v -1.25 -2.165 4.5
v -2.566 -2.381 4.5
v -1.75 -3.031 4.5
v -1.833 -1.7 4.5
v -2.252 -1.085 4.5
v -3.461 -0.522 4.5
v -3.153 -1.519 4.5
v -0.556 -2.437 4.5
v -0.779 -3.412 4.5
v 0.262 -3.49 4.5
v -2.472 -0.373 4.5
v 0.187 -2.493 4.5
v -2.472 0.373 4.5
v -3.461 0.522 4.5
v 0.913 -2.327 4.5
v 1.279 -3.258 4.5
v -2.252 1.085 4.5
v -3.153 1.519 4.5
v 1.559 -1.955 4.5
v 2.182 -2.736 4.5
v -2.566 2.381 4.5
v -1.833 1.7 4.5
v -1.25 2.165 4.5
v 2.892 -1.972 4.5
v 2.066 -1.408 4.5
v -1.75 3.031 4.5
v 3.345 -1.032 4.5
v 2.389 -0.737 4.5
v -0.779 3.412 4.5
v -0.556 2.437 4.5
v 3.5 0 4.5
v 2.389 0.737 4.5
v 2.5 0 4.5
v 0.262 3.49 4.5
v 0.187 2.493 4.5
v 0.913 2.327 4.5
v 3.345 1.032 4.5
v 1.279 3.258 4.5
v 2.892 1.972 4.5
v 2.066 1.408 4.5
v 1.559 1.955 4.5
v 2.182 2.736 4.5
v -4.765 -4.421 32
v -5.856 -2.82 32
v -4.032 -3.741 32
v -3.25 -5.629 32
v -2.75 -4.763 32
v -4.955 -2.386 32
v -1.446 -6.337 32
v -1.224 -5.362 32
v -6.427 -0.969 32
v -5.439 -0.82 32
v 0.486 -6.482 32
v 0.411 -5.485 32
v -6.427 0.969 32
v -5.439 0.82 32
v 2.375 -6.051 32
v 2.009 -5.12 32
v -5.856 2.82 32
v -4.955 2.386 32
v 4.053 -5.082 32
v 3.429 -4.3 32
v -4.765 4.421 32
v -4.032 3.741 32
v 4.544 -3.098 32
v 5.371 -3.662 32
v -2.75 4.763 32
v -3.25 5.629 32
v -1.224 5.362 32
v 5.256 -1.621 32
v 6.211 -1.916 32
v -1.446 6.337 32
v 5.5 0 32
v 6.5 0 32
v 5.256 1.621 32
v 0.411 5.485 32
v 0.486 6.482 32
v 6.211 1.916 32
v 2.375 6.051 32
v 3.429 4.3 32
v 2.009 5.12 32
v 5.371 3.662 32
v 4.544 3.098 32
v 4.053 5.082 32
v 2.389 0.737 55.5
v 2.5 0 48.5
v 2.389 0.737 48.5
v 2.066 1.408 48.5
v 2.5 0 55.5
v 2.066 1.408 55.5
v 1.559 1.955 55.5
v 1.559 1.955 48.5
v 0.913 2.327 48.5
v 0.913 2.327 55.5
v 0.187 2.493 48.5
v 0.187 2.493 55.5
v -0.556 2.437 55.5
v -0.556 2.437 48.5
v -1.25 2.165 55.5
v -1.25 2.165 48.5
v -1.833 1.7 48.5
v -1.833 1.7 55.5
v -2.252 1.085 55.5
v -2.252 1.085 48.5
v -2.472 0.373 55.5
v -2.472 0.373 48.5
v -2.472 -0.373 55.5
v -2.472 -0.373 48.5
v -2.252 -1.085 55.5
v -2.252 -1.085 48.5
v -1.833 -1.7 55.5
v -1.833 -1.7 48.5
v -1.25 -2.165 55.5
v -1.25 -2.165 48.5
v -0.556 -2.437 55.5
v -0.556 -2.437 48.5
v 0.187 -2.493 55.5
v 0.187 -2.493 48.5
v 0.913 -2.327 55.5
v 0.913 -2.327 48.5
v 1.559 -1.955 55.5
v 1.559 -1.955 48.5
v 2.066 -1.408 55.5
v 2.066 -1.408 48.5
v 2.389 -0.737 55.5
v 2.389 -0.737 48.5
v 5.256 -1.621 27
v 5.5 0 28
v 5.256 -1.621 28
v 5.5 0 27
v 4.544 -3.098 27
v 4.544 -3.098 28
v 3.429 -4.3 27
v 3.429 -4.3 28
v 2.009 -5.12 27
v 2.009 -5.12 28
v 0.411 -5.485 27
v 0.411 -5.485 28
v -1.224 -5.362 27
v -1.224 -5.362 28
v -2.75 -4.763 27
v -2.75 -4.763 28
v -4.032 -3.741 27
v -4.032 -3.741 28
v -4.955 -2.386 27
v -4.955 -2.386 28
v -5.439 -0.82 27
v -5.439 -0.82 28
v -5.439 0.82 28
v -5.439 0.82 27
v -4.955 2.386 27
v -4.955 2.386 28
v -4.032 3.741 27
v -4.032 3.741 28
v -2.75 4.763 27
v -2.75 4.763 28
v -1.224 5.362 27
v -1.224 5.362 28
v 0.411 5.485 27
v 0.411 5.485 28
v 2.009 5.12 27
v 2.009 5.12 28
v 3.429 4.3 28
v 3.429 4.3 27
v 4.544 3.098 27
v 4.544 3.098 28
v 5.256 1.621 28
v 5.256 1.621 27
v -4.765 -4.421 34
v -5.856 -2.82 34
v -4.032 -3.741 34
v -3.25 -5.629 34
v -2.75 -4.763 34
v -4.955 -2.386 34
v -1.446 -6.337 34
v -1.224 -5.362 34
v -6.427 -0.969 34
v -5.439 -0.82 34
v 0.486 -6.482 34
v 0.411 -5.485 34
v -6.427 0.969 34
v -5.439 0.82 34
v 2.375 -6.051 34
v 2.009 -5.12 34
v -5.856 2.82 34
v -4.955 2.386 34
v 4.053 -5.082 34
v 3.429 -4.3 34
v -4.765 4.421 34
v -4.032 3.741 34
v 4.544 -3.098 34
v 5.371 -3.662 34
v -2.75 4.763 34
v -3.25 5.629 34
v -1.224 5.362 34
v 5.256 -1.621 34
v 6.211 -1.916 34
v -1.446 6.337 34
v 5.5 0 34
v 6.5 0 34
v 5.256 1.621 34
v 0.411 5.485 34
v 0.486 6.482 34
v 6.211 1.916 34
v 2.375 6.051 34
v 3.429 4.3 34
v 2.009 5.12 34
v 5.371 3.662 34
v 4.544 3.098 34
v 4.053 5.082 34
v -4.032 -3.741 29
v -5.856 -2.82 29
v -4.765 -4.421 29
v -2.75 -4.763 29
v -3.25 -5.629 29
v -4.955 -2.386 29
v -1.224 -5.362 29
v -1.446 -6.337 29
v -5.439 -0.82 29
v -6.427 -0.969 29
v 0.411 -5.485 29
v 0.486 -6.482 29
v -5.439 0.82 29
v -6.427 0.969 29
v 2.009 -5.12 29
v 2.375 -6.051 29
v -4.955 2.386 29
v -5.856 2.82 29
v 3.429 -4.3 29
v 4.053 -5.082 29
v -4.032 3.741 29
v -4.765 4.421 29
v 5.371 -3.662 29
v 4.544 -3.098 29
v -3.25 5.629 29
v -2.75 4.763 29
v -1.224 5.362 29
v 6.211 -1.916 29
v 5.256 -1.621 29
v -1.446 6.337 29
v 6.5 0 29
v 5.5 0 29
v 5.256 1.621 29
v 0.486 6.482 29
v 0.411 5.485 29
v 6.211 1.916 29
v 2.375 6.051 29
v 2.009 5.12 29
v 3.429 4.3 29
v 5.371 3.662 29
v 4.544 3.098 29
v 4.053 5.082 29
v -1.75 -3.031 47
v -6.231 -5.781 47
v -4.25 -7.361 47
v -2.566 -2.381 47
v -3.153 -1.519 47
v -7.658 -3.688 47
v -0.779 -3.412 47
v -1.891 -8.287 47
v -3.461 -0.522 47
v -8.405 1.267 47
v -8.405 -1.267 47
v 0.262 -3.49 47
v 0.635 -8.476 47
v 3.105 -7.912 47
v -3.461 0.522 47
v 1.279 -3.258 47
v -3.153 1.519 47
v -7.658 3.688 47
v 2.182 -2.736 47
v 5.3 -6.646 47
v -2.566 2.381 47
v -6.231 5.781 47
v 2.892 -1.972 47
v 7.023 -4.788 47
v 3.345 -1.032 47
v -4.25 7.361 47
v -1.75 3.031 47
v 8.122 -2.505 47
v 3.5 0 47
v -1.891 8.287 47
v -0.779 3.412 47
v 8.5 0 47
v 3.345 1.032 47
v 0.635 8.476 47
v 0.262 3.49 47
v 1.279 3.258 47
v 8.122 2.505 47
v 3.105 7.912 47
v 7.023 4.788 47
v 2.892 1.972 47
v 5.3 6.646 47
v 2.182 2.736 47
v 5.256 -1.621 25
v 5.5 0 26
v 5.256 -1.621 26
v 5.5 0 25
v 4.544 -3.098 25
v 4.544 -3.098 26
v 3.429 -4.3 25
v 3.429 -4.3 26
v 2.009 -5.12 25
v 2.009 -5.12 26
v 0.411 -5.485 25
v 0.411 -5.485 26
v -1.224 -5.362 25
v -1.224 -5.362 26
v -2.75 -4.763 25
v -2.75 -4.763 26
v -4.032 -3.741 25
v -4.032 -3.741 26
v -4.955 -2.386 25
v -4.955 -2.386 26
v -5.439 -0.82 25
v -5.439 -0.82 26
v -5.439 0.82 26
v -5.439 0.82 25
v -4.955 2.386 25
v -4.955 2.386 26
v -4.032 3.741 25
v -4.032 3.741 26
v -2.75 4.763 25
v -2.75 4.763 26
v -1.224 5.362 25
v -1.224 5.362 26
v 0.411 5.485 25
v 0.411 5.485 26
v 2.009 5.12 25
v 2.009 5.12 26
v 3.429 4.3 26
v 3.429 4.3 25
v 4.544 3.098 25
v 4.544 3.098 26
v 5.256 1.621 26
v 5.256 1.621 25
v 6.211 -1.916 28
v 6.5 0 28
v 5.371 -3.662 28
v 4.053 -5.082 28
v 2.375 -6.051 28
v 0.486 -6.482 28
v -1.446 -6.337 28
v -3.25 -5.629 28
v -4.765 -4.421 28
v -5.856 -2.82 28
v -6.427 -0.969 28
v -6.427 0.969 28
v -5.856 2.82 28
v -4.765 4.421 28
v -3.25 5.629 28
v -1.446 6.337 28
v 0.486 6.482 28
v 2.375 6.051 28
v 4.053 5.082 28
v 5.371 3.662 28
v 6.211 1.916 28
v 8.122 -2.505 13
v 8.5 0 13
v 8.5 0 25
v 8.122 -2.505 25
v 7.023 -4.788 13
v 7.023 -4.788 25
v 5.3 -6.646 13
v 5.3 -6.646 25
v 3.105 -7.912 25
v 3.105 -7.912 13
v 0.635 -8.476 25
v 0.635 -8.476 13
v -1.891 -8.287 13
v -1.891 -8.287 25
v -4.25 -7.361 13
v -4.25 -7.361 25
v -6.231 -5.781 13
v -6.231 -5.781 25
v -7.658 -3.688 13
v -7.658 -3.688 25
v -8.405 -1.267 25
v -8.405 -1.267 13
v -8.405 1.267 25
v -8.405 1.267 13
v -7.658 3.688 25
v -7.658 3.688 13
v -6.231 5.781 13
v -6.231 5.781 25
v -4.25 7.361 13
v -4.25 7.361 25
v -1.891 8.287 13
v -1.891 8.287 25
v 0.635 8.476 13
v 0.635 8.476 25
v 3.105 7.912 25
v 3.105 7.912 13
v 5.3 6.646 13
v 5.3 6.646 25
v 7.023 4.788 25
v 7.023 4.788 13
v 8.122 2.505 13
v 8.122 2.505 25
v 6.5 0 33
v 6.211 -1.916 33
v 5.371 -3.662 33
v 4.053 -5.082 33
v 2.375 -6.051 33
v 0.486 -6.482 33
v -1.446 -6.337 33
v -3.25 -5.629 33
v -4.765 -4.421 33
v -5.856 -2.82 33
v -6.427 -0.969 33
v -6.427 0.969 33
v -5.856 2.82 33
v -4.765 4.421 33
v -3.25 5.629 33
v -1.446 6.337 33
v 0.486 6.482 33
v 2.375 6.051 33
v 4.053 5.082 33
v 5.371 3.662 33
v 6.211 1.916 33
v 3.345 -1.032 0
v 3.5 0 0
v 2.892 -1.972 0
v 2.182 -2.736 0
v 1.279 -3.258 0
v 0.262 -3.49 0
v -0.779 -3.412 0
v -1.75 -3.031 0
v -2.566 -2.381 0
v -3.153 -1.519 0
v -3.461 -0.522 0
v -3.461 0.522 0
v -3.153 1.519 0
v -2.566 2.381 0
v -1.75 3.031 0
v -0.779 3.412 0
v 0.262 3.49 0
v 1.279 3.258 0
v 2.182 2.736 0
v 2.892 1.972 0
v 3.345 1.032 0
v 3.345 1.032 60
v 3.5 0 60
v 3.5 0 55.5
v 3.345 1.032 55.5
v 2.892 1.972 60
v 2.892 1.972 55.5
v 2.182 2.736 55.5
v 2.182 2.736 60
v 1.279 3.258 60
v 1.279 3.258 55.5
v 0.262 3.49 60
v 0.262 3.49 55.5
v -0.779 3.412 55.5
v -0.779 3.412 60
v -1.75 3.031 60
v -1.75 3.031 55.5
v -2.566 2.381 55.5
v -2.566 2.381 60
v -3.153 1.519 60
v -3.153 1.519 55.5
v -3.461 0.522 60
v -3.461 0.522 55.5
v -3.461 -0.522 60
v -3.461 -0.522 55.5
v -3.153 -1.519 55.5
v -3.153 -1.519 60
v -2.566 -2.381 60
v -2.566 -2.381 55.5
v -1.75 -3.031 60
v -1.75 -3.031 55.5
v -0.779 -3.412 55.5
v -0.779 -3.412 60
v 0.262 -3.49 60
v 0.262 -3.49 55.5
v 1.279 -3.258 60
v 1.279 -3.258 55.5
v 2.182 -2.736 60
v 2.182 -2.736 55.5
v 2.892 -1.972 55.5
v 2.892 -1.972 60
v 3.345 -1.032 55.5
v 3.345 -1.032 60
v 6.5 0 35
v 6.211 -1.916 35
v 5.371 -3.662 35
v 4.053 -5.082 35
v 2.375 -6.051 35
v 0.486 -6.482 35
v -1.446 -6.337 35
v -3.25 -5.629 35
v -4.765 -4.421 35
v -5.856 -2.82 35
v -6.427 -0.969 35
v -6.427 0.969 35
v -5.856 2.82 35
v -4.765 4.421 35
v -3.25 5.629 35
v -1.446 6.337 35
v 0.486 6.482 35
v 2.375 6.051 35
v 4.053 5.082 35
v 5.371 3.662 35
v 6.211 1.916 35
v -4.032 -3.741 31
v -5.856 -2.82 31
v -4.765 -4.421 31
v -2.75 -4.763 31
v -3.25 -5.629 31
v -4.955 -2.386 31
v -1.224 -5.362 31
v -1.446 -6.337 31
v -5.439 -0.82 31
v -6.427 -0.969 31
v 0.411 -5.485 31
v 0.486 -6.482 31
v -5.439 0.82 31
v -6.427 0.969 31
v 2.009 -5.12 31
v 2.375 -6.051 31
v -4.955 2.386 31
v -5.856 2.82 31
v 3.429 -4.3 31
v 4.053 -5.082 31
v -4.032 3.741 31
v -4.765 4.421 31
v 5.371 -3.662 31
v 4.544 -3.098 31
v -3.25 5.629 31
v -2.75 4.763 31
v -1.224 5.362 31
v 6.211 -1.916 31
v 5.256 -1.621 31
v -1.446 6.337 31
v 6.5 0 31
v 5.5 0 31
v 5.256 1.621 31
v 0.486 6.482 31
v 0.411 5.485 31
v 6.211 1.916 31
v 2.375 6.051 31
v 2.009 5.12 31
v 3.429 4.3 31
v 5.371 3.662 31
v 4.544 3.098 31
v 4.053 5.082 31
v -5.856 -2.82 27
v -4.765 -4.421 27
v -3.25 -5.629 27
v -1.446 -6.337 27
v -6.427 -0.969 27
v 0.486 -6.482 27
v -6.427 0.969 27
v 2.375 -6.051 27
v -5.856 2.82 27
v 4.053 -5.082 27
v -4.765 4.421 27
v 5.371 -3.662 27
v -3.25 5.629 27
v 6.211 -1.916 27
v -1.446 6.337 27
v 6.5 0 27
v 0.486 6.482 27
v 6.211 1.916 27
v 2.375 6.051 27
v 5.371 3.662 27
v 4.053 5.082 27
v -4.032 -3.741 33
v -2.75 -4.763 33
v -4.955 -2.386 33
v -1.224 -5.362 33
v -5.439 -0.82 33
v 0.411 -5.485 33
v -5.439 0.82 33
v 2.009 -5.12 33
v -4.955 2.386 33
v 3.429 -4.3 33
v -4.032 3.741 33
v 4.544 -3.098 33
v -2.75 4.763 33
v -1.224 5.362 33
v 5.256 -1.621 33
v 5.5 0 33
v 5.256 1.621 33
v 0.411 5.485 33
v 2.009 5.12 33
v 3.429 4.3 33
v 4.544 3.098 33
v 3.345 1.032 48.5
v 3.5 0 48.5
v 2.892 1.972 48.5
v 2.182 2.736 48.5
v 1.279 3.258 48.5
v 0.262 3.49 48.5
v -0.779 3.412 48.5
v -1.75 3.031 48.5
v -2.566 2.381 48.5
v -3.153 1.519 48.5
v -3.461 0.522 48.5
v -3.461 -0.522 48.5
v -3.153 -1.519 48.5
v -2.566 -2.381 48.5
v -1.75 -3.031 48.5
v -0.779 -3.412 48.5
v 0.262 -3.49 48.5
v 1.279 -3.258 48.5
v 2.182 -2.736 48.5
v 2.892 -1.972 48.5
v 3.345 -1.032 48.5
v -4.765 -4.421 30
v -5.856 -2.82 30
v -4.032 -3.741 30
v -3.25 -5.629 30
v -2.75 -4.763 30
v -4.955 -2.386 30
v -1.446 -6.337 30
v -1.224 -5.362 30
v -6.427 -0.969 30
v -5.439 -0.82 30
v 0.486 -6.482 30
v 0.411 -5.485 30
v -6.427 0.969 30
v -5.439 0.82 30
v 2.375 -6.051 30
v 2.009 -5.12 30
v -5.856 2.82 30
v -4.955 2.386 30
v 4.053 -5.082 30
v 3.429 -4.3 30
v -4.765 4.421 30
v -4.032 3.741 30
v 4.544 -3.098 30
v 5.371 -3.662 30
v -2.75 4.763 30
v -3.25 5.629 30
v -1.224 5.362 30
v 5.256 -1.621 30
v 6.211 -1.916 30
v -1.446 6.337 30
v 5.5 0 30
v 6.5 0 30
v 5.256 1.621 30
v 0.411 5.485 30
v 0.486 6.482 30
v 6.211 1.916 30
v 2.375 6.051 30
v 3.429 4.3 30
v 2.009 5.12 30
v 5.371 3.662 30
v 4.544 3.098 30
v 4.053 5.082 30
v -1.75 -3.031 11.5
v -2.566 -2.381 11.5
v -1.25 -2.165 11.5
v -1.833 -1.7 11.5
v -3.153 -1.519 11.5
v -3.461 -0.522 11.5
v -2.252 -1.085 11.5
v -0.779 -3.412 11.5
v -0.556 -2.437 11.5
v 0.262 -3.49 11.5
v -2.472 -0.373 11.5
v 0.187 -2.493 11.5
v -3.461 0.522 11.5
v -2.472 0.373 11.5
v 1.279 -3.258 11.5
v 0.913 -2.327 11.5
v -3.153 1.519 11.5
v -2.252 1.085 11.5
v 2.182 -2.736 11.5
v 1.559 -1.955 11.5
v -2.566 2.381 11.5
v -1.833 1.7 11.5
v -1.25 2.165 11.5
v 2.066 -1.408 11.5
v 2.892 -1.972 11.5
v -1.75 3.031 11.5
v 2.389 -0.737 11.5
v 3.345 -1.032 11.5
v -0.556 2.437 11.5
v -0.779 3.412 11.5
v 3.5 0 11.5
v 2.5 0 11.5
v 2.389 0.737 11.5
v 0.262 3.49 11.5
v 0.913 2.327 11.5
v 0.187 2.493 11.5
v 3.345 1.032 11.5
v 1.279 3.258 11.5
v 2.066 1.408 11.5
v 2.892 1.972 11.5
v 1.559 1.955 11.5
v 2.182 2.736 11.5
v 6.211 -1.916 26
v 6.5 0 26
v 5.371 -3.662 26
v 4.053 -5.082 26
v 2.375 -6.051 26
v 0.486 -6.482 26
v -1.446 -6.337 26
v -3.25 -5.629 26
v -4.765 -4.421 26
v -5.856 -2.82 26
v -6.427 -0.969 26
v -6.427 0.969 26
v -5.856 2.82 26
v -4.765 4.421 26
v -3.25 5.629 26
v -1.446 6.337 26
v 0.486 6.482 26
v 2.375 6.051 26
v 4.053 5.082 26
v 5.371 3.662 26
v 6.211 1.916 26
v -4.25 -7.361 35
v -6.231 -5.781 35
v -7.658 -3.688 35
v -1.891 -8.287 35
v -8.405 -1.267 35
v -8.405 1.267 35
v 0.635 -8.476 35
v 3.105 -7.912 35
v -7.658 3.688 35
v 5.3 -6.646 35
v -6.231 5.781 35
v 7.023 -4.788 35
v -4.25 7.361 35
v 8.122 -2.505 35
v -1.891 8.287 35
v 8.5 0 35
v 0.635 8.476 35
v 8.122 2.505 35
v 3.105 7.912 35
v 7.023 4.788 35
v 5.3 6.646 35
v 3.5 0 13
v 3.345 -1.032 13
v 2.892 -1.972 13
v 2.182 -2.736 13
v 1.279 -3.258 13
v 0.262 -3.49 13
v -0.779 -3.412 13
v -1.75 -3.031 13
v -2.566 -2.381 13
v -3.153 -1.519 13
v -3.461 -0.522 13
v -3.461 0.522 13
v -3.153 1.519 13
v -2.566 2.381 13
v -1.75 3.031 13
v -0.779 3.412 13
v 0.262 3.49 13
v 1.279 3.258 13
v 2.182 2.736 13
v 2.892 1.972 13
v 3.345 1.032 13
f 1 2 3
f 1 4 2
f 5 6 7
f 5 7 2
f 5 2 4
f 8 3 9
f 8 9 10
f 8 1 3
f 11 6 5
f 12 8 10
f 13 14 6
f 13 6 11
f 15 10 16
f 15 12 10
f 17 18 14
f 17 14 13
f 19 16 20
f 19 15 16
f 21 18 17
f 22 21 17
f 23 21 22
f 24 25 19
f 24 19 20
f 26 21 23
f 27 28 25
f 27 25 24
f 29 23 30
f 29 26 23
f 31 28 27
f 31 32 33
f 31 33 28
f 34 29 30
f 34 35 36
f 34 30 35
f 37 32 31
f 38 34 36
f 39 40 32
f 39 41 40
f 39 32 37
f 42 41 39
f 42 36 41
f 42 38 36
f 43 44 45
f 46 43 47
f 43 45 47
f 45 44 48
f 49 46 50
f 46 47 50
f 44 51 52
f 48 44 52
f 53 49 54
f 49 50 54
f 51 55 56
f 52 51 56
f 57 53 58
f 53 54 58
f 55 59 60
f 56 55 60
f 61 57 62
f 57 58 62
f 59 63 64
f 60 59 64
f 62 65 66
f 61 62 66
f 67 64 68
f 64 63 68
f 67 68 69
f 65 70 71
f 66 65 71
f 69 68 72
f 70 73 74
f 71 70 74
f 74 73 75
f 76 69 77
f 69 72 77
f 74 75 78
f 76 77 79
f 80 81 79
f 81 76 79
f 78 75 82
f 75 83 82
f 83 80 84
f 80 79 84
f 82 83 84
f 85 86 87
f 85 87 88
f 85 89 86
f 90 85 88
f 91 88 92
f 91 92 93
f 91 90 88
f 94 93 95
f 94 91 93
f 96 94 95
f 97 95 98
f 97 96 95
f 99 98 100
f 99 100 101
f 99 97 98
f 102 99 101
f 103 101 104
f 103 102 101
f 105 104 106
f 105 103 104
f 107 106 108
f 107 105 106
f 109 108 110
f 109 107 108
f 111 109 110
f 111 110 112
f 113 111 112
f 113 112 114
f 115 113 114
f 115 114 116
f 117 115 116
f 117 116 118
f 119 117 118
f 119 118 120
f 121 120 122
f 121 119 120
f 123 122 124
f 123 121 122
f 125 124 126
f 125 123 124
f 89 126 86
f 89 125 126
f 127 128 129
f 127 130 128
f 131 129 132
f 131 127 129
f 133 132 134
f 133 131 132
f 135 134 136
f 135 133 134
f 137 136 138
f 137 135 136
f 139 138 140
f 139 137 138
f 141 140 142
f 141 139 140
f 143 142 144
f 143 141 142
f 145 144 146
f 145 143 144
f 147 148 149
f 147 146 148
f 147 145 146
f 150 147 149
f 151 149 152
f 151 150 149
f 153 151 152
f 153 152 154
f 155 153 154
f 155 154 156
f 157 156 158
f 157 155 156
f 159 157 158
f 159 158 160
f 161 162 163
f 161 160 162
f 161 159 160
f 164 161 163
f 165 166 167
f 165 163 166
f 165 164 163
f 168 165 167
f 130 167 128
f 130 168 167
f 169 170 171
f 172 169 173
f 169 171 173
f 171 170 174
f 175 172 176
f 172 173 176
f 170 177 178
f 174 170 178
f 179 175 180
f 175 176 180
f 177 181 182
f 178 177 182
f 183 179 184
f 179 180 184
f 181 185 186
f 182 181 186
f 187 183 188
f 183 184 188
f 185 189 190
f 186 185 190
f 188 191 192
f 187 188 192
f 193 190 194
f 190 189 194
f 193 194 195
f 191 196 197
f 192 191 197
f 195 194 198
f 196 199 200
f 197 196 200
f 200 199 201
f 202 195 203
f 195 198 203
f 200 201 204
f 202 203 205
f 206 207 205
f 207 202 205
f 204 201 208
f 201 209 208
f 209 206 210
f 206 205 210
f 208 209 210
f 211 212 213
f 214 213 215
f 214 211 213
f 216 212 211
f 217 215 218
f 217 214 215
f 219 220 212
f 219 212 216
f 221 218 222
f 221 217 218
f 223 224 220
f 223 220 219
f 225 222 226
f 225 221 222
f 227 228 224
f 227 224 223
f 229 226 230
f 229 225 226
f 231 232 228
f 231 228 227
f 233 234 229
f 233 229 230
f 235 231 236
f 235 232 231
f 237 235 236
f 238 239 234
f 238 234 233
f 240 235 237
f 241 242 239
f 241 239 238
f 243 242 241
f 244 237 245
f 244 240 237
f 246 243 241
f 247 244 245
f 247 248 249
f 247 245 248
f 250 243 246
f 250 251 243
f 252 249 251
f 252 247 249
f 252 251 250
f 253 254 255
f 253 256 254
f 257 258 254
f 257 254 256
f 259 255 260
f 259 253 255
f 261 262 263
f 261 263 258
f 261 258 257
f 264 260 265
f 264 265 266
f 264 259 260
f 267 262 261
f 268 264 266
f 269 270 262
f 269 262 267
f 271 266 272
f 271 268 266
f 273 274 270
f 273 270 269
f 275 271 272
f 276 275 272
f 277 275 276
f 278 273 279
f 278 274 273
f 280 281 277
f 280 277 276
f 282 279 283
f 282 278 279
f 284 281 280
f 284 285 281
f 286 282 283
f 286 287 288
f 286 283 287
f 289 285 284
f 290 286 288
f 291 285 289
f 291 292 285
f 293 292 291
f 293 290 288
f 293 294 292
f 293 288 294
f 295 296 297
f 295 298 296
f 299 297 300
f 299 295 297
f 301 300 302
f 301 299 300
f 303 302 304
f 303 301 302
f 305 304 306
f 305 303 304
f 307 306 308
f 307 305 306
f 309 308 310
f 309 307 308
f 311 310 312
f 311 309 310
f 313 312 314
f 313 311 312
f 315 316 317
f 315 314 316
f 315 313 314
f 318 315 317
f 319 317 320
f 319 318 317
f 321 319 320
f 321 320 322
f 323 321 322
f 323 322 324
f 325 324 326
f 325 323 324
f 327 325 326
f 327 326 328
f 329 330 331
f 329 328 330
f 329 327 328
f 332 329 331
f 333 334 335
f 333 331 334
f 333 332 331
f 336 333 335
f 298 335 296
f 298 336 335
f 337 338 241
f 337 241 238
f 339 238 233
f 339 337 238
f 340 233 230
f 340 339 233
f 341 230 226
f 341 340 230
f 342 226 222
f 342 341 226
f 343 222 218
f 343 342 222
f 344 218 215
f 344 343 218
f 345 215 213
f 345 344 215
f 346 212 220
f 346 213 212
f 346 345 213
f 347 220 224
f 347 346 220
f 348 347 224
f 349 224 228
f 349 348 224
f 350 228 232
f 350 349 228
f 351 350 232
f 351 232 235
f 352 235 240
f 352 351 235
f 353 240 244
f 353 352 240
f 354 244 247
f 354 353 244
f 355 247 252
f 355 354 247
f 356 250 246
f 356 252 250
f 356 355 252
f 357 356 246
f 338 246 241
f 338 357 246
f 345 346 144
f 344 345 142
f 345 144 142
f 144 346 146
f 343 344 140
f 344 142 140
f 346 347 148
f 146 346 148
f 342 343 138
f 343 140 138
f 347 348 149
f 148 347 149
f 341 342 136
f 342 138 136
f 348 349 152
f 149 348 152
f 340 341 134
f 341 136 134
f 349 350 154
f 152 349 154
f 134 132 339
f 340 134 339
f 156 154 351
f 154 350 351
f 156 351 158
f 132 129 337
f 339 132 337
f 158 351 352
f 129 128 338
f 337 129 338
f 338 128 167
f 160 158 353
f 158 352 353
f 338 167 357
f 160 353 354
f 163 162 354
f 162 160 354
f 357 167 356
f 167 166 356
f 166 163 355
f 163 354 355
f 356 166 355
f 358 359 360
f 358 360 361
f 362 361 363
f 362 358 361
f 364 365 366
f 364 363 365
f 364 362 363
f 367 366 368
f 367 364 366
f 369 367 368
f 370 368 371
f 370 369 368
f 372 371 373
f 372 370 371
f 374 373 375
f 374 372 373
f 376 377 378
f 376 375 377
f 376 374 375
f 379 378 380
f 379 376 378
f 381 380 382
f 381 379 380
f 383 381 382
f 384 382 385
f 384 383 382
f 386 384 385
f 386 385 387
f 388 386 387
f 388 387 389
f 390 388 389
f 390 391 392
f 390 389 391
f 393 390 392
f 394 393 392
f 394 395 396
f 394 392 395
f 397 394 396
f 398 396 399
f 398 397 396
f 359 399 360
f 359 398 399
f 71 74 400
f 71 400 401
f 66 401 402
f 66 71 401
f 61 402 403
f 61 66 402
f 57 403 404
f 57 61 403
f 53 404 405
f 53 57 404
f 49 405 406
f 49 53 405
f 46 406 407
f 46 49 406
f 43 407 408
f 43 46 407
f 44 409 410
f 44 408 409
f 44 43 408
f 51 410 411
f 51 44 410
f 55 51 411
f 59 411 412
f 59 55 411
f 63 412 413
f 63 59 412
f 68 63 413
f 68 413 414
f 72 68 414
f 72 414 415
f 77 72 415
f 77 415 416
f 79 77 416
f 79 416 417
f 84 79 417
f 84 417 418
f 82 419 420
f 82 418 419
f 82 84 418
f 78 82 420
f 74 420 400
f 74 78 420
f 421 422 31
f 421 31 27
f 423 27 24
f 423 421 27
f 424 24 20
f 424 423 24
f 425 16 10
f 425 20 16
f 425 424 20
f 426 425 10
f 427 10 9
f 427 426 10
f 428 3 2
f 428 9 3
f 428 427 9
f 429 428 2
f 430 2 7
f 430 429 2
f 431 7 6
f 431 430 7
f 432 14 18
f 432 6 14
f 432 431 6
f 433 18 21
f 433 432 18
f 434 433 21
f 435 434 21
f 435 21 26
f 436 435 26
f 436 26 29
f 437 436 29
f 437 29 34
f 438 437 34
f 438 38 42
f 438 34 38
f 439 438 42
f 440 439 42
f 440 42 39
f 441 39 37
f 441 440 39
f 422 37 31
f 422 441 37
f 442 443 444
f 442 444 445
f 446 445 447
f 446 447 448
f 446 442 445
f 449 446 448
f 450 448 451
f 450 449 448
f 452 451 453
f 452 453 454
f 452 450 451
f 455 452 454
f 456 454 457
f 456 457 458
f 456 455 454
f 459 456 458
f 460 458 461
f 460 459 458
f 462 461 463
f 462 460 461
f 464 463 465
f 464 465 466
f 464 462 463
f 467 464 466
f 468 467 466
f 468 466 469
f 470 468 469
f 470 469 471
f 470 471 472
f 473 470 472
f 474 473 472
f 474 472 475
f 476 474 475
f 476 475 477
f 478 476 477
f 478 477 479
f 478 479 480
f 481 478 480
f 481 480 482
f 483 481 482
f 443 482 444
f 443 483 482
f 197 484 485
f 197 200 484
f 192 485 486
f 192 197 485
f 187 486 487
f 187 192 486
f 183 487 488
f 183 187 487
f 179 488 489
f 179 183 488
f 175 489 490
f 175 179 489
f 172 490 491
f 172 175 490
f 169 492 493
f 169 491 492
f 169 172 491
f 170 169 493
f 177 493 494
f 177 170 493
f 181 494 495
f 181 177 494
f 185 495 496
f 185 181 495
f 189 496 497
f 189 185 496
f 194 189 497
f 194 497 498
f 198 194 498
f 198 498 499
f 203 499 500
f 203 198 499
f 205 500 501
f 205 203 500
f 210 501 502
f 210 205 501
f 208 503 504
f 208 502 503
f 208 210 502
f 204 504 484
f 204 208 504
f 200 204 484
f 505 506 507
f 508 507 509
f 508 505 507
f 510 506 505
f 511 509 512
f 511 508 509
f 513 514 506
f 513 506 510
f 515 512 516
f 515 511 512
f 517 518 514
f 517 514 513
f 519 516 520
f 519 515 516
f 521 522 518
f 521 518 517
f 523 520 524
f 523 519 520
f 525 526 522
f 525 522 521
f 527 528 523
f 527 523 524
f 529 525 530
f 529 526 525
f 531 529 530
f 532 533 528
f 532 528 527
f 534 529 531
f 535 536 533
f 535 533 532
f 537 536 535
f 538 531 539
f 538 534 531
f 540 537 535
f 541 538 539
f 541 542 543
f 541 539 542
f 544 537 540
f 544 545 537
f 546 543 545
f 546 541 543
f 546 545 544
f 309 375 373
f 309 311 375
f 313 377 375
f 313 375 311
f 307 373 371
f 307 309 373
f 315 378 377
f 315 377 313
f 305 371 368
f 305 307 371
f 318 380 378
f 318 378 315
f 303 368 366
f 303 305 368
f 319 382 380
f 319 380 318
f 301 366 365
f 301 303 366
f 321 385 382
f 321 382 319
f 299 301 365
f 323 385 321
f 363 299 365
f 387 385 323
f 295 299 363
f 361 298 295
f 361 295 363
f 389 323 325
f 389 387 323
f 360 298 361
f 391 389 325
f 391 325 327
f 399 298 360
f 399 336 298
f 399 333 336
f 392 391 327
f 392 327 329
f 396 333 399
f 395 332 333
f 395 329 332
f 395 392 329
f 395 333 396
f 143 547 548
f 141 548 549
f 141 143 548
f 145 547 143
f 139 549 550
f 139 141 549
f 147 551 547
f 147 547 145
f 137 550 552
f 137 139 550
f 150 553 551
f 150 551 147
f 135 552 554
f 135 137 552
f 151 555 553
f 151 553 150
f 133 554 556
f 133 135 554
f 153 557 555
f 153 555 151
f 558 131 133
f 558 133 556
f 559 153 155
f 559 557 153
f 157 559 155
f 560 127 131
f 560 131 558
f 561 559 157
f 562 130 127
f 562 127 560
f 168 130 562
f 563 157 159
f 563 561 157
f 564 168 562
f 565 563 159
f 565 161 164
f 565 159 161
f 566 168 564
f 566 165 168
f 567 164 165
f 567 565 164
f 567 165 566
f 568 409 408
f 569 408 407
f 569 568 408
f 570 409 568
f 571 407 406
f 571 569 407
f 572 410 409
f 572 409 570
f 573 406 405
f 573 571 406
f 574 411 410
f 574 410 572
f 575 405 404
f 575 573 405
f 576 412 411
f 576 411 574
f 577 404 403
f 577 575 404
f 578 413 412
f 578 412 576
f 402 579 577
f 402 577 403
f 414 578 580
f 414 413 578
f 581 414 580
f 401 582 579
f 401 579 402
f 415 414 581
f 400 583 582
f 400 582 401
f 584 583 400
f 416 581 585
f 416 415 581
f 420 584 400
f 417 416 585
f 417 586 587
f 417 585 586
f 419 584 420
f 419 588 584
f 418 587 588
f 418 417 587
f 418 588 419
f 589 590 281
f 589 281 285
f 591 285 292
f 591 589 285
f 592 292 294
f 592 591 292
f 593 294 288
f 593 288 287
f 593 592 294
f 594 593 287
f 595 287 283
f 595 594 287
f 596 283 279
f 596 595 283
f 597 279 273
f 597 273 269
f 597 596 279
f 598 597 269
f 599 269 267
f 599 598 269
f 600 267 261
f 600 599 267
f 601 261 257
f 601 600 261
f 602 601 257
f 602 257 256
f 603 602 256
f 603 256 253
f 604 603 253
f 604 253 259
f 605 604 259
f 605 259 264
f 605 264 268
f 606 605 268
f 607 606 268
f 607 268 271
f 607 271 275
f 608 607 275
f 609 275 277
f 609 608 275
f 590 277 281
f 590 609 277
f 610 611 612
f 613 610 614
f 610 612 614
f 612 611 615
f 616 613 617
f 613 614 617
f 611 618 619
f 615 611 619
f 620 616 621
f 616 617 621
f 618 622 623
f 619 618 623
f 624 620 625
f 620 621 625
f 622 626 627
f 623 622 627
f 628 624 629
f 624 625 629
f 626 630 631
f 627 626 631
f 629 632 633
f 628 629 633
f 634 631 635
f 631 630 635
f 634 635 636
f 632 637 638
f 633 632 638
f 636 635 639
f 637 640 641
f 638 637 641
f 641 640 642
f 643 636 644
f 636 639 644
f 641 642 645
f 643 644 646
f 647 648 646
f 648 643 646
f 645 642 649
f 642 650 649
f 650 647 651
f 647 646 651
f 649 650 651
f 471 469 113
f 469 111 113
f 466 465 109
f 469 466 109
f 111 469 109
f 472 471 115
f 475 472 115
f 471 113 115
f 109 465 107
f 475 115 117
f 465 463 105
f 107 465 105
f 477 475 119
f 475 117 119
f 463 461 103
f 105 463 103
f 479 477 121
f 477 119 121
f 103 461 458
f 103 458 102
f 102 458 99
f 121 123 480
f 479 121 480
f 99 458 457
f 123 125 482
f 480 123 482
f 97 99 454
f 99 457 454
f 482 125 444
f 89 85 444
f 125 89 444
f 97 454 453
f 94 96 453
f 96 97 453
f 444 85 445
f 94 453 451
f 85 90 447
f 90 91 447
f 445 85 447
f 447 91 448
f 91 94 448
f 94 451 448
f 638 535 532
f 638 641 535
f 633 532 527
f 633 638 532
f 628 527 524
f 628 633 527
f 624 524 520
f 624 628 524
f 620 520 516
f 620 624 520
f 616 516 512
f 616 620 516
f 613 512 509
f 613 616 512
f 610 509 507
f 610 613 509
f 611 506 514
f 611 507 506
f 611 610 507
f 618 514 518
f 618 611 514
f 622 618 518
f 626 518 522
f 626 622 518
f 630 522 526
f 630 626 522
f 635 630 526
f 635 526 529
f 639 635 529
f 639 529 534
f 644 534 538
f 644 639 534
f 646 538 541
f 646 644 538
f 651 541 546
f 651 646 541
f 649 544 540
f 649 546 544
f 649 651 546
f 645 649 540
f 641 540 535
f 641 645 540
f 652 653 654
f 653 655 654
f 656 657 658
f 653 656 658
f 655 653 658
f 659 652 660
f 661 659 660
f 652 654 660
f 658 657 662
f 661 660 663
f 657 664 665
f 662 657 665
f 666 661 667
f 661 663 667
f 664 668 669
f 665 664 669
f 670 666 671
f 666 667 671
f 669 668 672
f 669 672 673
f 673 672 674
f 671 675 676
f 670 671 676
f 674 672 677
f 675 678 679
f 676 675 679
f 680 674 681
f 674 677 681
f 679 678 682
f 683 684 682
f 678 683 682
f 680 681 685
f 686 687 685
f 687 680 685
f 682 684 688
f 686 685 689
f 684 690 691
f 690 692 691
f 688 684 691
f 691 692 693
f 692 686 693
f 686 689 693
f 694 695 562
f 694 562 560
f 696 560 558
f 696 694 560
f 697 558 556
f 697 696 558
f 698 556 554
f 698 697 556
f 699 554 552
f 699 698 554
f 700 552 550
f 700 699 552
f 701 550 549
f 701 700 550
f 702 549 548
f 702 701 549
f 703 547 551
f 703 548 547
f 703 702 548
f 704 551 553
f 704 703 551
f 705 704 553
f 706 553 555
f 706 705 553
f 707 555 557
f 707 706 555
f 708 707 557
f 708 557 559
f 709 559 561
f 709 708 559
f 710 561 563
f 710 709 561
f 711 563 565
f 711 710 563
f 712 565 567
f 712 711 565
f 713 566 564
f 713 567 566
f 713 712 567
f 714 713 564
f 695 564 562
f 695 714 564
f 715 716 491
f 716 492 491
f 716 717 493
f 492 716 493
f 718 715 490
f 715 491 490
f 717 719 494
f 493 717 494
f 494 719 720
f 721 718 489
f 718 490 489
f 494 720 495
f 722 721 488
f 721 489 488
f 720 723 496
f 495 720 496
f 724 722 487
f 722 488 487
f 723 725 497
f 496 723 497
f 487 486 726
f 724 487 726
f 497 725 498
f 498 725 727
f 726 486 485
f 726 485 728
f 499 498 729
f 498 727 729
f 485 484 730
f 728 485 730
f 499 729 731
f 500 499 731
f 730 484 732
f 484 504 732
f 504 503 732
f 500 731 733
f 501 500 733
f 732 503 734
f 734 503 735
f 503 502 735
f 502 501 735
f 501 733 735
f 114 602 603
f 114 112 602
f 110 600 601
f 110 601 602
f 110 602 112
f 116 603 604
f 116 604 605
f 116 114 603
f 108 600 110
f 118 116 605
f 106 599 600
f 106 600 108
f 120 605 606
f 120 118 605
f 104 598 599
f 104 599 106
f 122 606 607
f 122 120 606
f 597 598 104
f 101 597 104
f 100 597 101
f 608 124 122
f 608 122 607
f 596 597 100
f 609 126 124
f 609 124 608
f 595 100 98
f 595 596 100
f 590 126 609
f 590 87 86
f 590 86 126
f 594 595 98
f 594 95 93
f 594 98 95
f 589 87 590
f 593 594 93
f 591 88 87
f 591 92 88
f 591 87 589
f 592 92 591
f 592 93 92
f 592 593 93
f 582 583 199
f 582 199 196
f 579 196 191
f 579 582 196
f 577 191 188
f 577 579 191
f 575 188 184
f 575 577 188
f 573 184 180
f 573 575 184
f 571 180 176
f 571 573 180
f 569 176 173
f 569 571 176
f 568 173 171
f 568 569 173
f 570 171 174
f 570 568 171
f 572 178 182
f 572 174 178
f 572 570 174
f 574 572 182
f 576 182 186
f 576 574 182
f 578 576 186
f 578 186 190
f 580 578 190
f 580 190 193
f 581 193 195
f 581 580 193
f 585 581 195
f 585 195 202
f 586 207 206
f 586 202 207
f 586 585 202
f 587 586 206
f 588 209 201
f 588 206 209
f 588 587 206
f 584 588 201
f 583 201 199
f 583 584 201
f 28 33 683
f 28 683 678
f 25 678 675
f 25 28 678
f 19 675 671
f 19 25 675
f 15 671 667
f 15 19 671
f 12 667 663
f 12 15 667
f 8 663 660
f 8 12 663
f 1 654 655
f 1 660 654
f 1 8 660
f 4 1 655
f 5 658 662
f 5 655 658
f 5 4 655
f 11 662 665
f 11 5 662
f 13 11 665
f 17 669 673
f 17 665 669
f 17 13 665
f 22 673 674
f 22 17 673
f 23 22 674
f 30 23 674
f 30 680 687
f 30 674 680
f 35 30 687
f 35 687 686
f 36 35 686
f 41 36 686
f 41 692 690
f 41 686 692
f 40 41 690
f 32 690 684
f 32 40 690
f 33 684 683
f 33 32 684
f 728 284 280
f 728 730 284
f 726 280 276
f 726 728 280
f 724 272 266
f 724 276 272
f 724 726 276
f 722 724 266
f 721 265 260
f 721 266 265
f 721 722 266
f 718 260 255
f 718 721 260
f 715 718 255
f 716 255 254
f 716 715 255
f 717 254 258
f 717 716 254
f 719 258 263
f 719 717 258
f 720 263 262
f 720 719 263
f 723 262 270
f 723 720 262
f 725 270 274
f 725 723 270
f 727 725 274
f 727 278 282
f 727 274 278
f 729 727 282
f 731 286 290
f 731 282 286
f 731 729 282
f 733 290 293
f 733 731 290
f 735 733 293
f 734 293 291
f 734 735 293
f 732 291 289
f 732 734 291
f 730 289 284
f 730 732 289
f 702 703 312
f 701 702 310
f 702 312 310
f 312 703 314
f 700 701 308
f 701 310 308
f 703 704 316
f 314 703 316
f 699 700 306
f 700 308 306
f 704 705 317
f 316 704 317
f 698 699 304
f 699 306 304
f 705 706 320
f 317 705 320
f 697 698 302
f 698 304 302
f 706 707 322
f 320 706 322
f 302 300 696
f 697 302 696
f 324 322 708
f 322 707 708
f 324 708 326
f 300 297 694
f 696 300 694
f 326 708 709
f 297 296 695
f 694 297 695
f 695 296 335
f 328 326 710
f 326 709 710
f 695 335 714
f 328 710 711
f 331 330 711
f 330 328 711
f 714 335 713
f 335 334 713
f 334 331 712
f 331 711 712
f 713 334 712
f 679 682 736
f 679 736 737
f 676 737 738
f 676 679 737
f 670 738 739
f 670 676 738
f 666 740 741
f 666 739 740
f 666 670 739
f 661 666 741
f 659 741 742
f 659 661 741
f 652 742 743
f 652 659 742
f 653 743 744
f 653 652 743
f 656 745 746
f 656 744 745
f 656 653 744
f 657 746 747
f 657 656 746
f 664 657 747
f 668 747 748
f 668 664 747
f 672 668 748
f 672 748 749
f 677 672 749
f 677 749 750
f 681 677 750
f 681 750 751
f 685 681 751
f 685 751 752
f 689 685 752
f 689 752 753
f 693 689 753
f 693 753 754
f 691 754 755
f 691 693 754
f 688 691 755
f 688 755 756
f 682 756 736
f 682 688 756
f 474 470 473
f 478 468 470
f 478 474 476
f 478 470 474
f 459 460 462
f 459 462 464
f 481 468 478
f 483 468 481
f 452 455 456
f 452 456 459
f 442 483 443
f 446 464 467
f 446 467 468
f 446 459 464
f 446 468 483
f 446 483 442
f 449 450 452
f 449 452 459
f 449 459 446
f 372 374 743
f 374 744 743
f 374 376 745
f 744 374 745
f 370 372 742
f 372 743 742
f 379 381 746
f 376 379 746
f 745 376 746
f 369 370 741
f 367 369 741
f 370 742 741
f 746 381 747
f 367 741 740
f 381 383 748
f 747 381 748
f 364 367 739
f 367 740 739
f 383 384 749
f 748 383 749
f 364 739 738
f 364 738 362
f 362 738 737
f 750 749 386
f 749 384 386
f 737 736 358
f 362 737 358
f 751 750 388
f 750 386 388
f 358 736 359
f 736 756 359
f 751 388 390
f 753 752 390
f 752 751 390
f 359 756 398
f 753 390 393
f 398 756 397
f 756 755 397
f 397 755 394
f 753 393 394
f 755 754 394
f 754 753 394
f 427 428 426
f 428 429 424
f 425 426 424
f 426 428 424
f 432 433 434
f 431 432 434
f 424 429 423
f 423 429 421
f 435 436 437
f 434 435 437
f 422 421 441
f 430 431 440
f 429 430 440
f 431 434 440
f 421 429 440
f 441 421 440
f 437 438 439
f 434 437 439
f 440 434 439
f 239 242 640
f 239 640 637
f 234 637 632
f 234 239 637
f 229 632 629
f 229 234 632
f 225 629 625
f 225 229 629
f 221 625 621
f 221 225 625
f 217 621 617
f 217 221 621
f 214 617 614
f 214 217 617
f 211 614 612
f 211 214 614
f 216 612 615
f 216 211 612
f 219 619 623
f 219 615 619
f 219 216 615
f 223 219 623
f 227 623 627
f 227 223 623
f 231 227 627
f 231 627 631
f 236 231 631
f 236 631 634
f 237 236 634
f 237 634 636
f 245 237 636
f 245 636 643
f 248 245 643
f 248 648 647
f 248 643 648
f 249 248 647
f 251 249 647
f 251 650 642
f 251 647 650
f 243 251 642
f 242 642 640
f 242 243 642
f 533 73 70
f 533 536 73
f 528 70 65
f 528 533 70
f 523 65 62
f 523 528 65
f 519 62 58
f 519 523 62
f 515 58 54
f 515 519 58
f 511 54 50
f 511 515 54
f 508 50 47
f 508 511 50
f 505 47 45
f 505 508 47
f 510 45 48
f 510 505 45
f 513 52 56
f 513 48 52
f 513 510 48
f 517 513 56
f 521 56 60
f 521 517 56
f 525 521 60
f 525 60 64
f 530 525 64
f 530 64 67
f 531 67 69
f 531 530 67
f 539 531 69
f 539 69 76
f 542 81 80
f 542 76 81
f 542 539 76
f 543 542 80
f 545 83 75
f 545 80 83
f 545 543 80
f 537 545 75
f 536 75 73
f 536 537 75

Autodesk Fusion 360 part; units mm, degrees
sketch "Sketch1" plane through (0, 0, 0) normal (0, 0, 1) x (1, 0, 0)
  circle A0 centre (0, 0) radius 3.5
  circle A1 centre (0, 0) radius 8.5
  circle A2 centre (0, 0) radius 2.5
  circle A3 centre (0, 0) radius 6.5
  circle A4 centre (0, 0) radius 5.5
  dimension "d1" = 7
  dimension "d2" = 5
  dimension "d10" = -1
  dimension "d17" = -2
  dimension "d21" = -1
extrude "Extrude1" add sketch "Sketch1" along normal blind 60 contours A0 | A1 | A2 | A3 | A4
extrude "Extrude2" cut sketch "Sketch1" along normal blind 13 contours A1 | A3 | A4
extrude "Extrude3" cut sketch "Sketch1" against normal blind 13 from surface at 60 contours A1 | A3 | A4
extrude "Extrude4" cut sketch "Sketch1" along normal blind 7 from surface at 4.5 contours A0
extrude "Extrude5" cut sketch "Sketch1" against normal blind 7 from surface at 55.5 contours A0
extrude "Extrude6" cut sketch "Sketch1" along normal blind 10 from surface at 25 contours A1
extrude "Extrude7" cut sketch "Sketch1" along normal blind 1 from surface at 25 contours A3
extrude "Extrude8" cut sketch "Sketch1" along normal blind 1 from surface at 27 contours A3
extrude "Extrude9" cut sketch "Sketch1" along normal blind 1 from surface at 29 contours A3
extrude "Extrude10" cut sketch "Sketch1" along normal blind 1 from surface at 31 contours A3
extrude "Extrude11" cut sketch "Sketch1" along normal blind 1 from surface at 33 contours A3
